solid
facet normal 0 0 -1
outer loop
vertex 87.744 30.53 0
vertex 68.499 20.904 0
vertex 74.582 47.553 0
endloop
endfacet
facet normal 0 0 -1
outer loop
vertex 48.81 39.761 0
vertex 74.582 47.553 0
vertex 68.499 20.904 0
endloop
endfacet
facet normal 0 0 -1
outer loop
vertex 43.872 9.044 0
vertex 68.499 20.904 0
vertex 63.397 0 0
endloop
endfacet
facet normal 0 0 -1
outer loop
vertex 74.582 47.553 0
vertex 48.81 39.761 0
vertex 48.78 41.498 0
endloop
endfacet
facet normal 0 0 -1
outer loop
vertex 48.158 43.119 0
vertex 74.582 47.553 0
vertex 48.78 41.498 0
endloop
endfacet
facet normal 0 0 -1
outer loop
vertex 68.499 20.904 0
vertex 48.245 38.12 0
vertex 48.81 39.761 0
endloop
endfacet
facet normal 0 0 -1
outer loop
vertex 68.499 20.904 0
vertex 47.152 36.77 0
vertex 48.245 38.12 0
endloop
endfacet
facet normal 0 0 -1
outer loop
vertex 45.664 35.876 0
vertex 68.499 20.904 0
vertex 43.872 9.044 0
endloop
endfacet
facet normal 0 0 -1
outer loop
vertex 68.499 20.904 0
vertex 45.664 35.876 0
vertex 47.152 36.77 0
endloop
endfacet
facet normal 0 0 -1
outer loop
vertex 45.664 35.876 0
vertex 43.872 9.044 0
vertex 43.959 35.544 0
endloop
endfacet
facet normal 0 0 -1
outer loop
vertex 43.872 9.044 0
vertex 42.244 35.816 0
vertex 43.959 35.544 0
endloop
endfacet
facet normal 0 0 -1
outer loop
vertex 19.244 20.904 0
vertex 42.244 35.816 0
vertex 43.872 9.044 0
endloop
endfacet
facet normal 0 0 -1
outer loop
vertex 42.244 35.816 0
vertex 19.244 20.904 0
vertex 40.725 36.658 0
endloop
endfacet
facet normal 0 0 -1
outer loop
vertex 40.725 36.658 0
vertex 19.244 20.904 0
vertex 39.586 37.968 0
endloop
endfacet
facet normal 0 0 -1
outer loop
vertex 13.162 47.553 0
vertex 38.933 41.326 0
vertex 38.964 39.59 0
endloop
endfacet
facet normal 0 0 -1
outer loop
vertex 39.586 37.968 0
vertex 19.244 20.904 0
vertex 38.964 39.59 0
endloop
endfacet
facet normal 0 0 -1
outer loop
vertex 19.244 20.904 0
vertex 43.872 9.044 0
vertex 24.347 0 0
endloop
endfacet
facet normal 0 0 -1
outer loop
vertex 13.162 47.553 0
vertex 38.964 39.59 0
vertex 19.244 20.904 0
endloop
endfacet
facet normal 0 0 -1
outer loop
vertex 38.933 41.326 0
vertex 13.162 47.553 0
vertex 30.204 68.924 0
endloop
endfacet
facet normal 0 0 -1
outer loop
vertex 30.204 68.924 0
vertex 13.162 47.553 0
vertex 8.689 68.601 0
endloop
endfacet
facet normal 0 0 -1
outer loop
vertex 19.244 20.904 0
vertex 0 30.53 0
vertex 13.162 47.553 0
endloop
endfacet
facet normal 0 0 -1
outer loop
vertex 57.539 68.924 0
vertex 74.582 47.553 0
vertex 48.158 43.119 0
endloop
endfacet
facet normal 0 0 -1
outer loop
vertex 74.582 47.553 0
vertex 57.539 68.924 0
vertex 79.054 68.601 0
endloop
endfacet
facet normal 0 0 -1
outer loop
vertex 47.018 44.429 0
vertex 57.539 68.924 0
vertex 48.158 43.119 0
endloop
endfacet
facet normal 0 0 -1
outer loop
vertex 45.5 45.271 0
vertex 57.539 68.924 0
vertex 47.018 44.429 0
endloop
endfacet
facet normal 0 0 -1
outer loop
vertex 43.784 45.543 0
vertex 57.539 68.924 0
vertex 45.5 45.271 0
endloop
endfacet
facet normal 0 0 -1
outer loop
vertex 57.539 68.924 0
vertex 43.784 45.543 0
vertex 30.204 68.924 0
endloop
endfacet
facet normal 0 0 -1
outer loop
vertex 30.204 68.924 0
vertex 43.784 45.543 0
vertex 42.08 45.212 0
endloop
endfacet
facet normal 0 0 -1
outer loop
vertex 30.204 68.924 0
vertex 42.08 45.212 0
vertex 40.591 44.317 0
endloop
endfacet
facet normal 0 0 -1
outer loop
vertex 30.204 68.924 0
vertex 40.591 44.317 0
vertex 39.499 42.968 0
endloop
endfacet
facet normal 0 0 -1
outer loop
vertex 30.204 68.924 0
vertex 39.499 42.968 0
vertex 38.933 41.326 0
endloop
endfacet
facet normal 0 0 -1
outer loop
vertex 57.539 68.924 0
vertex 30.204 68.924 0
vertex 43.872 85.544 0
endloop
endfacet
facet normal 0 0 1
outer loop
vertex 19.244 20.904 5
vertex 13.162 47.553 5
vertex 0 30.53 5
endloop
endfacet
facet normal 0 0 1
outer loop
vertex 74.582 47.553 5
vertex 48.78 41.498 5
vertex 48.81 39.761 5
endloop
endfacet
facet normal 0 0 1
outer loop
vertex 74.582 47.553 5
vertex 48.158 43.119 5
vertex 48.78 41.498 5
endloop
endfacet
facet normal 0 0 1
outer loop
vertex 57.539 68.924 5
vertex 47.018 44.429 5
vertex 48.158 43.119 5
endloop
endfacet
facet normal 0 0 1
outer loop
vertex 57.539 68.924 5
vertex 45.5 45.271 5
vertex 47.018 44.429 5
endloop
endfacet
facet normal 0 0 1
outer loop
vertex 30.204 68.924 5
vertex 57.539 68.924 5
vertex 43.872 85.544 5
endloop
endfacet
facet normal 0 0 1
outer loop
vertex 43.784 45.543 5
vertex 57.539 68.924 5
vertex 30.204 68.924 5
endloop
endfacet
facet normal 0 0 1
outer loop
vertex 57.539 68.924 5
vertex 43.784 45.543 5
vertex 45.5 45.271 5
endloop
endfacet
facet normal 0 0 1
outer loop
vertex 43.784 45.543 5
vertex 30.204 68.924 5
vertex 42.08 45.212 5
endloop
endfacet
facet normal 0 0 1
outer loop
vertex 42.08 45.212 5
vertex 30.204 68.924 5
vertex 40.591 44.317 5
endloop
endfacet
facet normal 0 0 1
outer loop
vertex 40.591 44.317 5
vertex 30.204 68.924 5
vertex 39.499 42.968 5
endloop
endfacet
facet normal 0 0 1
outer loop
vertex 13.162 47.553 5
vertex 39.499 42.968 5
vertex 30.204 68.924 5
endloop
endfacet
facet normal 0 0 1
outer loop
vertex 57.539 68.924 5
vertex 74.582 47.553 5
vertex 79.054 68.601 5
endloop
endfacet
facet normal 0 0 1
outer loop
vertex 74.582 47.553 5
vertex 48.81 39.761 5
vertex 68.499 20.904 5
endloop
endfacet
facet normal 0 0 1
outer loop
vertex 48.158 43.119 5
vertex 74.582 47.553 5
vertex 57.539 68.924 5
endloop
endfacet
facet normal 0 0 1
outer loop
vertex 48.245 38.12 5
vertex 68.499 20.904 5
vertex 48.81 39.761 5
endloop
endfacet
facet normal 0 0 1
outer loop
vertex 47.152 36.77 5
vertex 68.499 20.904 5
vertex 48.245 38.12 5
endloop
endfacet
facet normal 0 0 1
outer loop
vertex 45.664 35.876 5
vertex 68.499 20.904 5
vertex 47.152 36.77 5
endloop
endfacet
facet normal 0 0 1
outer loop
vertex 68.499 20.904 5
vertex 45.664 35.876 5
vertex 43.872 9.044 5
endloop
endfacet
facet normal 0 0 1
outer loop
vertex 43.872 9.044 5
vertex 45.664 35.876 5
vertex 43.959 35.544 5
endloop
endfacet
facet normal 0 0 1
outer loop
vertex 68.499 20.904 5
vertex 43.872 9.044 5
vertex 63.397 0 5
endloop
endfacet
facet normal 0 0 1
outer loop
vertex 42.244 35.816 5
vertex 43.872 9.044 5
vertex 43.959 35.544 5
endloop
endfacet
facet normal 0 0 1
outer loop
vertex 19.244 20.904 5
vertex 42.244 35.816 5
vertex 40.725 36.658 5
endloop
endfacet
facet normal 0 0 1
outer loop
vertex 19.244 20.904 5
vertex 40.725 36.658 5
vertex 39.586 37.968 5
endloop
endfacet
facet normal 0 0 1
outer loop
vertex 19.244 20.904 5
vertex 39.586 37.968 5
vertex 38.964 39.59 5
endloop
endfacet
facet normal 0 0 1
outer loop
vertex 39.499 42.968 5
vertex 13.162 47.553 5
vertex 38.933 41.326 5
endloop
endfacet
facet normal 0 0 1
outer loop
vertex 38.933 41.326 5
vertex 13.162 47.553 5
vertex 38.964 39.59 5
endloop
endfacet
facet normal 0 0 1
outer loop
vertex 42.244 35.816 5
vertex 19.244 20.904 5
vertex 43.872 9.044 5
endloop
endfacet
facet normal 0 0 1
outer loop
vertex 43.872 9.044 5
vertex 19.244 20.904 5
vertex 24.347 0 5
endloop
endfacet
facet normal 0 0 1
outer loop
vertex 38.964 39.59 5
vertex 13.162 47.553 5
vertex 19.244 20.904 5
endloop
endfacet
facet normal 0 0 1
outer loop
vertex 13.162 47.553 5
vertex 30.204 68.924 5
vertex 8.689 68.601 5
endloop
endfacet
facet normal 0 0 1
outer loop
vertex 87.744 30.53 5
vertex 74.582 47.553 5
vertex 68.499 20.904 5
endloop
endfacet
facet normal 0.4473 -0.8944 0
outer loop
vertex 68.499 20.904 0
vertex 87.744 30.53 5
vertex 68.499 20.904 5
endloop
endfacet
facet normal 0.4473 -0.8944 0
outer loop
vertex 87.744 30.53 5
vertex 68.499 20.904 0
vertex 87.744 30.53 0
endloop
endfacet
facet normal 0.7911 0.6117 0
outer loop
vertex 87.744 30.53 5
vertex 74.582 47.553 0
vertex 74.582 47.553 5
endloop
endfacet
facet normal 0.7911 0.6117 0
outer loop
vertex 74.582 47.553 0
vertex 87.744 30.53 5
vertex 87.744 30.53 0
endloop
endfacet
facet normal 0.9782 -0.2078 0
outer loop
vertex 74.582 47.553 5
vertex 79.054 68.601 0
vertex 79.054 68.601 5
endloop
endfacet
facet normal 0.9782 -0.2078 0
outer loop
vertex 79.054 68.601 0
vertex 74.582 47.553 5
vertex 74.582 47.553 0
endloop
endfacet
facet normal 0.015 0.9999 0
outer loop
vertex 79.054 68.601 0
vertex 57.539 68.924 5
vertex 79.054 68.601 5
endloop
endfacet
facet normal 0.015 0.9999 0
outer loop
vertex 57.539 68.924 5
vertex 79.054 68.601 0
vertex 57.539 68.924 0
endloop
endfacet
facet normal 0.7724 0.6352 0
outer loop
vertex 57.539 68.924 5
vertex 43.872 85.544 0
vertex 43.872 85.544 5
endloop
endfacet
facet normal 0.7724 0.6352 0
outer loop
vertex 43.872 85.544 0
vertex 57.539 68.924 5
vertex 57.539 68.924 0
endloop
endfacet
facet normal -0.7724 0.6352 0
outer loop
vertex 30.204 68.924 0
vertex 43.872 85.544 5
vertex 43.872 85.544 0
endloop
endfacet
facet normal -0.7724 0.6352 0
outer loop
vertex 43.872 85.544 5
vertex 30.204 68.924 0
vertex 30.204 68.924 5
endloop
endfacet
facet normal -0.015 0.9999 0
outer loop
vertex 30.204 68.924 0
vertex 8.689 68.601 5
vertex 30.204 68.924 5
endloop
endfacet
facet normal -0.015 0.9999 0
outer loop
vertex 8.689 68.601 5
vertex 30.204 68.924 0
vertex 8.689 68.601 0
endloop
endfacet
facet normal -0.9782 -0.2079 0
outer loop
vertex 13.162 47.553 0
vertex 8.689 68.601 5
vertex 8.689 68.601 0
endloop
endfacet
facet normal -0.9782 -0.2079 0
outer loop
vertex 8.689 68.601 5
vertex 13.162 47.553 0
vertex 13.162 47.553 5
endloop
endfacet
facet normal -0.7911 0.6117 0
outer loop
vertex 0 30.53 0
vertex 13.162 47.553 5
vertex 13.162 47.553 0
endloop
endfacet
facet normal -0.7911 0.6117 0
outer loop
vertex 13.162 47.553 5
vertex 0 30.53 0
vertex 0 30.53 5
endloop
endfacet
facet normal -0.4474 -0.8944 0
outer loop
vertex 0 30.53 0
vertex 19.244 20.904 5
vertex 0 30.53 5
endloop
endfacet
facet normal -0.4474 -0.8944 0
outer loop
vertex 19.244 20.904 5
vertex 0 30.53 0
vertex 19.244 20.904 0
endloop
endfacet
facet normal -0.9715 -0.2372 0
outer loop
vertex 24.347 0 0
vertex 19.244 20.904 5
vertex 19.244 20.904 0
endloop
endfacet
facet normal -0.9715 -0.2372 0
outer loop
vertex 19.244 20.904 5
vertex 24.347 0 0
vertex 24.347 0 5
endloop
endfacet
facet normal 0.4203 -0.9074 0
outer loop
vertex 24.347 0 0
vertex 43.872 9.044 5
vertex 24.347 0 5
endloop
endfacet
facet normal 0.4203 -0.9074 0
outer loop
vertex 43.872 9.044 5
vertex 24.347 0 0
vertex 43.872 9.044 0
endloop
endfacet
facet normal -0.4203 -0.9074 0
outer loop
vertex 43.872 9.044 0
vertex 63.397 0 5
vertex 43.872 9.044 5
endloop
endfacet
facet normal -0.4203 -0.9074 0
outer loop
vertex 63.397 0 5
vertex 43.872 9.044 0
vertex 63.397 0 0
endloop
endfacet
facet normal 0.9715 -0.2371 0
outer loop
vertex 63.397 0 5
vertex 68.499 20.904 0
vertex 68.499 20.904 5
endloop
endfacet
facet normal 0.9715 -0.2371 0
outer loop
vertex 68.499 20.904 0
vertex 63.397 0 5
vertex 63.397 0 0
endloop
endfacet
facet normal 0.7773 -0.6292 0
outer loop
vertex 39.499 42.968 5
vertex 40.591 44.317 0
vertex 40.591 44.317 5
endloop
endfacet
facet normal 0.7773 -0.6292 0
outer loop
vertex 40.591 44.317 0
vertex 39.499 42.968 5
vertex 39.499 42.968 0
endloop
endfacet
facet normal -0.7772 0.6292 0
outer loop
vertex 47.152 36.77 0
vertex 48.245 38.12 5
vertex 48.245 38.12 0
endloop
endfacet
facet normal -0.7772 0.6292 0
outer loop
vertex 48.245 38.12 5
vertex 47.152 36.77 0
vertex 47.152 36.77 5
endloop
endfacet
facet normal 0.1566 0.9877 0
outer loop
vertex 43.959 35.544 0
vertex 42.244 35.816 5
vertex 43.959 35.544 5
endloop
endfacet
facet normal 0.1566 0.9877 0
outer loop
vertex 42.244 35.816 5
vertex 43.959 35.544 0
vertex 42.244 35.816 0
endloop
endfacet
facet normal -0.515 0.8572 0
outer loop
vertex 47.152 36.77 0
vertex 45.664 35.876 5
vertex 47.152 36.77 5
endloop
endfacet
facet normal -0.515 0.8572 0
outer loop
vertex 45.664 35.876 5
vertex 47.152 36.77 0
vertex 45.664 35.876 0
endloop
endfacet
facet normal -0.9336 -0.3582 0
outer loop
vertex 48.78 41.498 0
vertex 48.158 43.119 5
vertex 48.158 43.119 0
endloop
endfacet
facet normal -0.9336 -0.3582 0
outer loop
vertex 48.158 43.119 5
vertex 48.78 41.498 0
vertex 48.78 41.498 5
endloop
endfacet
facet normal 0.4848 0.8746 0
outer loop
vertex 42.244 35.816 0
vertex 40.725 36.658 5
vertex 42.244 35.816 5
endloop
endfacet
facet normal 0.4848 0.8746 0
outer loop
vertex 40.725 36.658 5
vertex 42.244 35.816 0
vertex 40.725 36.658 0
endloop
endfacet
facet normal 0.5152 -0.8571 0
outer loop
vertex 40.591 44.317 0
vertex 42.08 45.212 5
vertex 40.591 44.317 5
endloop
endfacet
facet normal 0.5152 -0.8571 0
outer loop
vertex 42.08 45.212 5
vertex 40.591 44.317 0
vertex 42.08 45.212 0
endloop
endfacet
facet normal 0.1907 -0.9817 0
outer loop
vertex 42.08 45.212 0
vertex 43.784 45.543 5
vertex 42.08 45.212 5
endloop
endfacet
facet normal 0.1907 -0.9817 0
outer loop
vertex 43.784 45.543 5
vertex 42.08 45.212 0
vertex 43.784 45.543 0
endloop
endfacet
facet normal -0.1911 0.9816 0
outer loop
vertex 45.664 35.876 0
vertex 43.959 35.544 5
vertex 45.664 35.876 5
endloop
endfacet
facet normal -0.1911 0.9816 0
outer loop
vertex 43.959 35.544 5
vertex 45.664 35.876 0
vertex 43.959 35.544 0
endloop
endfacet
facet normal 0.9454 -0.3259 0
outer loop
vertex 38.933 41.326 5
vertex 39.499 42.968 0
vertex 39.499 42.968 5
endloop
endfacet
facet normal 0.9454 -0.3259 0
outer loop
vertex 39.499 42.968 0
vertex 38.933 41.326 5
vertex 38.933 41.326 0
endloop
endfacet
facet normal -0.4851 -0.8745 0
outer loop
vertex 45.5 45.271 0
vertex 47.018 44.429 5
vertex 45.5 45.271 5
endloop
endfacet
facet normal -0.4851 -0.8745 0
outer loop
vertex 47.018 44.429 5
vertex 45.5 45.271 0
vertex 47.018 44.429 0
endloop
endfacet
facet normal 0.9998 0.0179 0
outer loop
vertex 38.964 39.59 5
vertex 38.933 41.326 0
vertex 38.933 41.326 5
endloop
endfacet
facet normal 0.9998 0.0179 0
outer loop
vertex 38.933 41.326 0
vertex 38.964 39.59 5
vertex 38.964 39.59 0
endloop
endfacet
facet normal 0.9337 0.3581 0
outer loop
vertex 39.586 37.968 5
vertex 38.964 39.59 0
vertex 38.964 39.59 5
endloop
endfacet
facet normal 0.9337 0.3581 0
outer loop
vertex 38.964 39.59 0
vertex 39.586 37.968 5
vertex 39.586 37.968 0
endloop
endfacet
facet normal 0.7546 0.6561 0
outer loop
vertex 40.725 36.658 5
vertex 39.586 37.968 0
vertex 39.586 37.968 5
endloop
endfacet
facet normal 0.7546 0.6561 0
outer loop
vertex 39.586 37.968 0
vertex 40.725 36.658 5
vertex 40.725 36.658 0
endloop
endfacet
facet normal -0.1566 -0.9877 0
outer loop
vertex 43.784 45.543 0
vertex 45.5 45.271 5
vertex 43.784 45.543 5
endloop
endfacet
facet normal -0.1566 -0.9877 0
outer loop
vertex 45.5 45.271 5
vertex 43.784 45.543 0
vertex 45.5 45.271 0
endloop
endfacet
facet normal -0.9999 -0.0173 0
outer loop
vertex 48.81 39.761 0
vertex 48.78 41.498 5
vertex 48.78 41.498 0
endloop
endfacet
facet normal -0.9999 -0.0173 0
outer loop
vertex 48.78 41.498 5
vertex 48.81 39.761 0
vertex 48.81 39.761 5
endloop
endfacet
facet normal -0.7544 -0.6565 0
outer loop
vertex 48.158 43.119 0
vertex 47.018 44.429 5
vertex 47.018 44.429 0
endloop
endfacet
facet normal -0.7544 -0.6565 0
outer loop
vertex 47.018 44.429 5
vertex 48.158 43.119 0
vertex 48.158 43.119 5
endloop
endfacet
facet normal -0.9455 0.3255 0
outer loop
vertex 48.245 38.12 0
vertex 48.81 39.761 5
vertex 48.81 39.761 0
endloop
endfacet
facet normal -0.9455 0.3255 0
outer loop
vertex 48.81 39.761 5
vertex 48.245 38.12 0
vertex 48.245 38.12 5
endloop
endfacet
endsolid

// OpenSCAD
$fn = 32;

// ----------------------------------------------------------------------
// Star wheel: 7-point blunt, R45
// ----------------------------------------------------------------------

// --- parameters (mm) ---
n_points = 7;             // number of points / teeth
r_out = 45;               // tip radius
r_in = 31.5;              // root radius
bore_r = 5;               // centre bore radius
plate_t = 5;              // plate thickness, Z (extrusion height)
bore_d = 10;              // centre bore diameter

profile = [[43.872, 85.544], [30.204, 68.924], [8.689, 68.601], [13.162, 47.553], [0, 30.53], [19.244, 20.904], [24.347, 0], [43.872, 9.044], [63.397, 0], [68.499, 20.904], [87.744, 30.53], [74.582, 47.553], [79.054, 68.601], [57.539, 68.924]];  // primary outline, 14 points, counter clockwise
void_1 = [[48.78, 41.498], [48.158, 43.119], [47.018, 44.429], [45.5, 45.271], [43.784, 45.543], [42.08, 45.212], [40.591, 44.317], [39.499, 42.968], [38.933, 41.326], [38.964, 39.59], [39.586, 37.968], [40.725, 36.658], [42.244, 35.816], [43.959, 35.544], [45.664, 35.876], [47.152, 36.77], [48.245, 38.12], [48.81, 39.761]];  // centre bore, 18 points

// --- the one profile operation ---
difference() {
  linear_extrude(height = plate_t) polygon(points = profile);
  translate([0, 0, -1])
    linear_extrude(height = plate_t + 2) polygon(points = void_1);
}
